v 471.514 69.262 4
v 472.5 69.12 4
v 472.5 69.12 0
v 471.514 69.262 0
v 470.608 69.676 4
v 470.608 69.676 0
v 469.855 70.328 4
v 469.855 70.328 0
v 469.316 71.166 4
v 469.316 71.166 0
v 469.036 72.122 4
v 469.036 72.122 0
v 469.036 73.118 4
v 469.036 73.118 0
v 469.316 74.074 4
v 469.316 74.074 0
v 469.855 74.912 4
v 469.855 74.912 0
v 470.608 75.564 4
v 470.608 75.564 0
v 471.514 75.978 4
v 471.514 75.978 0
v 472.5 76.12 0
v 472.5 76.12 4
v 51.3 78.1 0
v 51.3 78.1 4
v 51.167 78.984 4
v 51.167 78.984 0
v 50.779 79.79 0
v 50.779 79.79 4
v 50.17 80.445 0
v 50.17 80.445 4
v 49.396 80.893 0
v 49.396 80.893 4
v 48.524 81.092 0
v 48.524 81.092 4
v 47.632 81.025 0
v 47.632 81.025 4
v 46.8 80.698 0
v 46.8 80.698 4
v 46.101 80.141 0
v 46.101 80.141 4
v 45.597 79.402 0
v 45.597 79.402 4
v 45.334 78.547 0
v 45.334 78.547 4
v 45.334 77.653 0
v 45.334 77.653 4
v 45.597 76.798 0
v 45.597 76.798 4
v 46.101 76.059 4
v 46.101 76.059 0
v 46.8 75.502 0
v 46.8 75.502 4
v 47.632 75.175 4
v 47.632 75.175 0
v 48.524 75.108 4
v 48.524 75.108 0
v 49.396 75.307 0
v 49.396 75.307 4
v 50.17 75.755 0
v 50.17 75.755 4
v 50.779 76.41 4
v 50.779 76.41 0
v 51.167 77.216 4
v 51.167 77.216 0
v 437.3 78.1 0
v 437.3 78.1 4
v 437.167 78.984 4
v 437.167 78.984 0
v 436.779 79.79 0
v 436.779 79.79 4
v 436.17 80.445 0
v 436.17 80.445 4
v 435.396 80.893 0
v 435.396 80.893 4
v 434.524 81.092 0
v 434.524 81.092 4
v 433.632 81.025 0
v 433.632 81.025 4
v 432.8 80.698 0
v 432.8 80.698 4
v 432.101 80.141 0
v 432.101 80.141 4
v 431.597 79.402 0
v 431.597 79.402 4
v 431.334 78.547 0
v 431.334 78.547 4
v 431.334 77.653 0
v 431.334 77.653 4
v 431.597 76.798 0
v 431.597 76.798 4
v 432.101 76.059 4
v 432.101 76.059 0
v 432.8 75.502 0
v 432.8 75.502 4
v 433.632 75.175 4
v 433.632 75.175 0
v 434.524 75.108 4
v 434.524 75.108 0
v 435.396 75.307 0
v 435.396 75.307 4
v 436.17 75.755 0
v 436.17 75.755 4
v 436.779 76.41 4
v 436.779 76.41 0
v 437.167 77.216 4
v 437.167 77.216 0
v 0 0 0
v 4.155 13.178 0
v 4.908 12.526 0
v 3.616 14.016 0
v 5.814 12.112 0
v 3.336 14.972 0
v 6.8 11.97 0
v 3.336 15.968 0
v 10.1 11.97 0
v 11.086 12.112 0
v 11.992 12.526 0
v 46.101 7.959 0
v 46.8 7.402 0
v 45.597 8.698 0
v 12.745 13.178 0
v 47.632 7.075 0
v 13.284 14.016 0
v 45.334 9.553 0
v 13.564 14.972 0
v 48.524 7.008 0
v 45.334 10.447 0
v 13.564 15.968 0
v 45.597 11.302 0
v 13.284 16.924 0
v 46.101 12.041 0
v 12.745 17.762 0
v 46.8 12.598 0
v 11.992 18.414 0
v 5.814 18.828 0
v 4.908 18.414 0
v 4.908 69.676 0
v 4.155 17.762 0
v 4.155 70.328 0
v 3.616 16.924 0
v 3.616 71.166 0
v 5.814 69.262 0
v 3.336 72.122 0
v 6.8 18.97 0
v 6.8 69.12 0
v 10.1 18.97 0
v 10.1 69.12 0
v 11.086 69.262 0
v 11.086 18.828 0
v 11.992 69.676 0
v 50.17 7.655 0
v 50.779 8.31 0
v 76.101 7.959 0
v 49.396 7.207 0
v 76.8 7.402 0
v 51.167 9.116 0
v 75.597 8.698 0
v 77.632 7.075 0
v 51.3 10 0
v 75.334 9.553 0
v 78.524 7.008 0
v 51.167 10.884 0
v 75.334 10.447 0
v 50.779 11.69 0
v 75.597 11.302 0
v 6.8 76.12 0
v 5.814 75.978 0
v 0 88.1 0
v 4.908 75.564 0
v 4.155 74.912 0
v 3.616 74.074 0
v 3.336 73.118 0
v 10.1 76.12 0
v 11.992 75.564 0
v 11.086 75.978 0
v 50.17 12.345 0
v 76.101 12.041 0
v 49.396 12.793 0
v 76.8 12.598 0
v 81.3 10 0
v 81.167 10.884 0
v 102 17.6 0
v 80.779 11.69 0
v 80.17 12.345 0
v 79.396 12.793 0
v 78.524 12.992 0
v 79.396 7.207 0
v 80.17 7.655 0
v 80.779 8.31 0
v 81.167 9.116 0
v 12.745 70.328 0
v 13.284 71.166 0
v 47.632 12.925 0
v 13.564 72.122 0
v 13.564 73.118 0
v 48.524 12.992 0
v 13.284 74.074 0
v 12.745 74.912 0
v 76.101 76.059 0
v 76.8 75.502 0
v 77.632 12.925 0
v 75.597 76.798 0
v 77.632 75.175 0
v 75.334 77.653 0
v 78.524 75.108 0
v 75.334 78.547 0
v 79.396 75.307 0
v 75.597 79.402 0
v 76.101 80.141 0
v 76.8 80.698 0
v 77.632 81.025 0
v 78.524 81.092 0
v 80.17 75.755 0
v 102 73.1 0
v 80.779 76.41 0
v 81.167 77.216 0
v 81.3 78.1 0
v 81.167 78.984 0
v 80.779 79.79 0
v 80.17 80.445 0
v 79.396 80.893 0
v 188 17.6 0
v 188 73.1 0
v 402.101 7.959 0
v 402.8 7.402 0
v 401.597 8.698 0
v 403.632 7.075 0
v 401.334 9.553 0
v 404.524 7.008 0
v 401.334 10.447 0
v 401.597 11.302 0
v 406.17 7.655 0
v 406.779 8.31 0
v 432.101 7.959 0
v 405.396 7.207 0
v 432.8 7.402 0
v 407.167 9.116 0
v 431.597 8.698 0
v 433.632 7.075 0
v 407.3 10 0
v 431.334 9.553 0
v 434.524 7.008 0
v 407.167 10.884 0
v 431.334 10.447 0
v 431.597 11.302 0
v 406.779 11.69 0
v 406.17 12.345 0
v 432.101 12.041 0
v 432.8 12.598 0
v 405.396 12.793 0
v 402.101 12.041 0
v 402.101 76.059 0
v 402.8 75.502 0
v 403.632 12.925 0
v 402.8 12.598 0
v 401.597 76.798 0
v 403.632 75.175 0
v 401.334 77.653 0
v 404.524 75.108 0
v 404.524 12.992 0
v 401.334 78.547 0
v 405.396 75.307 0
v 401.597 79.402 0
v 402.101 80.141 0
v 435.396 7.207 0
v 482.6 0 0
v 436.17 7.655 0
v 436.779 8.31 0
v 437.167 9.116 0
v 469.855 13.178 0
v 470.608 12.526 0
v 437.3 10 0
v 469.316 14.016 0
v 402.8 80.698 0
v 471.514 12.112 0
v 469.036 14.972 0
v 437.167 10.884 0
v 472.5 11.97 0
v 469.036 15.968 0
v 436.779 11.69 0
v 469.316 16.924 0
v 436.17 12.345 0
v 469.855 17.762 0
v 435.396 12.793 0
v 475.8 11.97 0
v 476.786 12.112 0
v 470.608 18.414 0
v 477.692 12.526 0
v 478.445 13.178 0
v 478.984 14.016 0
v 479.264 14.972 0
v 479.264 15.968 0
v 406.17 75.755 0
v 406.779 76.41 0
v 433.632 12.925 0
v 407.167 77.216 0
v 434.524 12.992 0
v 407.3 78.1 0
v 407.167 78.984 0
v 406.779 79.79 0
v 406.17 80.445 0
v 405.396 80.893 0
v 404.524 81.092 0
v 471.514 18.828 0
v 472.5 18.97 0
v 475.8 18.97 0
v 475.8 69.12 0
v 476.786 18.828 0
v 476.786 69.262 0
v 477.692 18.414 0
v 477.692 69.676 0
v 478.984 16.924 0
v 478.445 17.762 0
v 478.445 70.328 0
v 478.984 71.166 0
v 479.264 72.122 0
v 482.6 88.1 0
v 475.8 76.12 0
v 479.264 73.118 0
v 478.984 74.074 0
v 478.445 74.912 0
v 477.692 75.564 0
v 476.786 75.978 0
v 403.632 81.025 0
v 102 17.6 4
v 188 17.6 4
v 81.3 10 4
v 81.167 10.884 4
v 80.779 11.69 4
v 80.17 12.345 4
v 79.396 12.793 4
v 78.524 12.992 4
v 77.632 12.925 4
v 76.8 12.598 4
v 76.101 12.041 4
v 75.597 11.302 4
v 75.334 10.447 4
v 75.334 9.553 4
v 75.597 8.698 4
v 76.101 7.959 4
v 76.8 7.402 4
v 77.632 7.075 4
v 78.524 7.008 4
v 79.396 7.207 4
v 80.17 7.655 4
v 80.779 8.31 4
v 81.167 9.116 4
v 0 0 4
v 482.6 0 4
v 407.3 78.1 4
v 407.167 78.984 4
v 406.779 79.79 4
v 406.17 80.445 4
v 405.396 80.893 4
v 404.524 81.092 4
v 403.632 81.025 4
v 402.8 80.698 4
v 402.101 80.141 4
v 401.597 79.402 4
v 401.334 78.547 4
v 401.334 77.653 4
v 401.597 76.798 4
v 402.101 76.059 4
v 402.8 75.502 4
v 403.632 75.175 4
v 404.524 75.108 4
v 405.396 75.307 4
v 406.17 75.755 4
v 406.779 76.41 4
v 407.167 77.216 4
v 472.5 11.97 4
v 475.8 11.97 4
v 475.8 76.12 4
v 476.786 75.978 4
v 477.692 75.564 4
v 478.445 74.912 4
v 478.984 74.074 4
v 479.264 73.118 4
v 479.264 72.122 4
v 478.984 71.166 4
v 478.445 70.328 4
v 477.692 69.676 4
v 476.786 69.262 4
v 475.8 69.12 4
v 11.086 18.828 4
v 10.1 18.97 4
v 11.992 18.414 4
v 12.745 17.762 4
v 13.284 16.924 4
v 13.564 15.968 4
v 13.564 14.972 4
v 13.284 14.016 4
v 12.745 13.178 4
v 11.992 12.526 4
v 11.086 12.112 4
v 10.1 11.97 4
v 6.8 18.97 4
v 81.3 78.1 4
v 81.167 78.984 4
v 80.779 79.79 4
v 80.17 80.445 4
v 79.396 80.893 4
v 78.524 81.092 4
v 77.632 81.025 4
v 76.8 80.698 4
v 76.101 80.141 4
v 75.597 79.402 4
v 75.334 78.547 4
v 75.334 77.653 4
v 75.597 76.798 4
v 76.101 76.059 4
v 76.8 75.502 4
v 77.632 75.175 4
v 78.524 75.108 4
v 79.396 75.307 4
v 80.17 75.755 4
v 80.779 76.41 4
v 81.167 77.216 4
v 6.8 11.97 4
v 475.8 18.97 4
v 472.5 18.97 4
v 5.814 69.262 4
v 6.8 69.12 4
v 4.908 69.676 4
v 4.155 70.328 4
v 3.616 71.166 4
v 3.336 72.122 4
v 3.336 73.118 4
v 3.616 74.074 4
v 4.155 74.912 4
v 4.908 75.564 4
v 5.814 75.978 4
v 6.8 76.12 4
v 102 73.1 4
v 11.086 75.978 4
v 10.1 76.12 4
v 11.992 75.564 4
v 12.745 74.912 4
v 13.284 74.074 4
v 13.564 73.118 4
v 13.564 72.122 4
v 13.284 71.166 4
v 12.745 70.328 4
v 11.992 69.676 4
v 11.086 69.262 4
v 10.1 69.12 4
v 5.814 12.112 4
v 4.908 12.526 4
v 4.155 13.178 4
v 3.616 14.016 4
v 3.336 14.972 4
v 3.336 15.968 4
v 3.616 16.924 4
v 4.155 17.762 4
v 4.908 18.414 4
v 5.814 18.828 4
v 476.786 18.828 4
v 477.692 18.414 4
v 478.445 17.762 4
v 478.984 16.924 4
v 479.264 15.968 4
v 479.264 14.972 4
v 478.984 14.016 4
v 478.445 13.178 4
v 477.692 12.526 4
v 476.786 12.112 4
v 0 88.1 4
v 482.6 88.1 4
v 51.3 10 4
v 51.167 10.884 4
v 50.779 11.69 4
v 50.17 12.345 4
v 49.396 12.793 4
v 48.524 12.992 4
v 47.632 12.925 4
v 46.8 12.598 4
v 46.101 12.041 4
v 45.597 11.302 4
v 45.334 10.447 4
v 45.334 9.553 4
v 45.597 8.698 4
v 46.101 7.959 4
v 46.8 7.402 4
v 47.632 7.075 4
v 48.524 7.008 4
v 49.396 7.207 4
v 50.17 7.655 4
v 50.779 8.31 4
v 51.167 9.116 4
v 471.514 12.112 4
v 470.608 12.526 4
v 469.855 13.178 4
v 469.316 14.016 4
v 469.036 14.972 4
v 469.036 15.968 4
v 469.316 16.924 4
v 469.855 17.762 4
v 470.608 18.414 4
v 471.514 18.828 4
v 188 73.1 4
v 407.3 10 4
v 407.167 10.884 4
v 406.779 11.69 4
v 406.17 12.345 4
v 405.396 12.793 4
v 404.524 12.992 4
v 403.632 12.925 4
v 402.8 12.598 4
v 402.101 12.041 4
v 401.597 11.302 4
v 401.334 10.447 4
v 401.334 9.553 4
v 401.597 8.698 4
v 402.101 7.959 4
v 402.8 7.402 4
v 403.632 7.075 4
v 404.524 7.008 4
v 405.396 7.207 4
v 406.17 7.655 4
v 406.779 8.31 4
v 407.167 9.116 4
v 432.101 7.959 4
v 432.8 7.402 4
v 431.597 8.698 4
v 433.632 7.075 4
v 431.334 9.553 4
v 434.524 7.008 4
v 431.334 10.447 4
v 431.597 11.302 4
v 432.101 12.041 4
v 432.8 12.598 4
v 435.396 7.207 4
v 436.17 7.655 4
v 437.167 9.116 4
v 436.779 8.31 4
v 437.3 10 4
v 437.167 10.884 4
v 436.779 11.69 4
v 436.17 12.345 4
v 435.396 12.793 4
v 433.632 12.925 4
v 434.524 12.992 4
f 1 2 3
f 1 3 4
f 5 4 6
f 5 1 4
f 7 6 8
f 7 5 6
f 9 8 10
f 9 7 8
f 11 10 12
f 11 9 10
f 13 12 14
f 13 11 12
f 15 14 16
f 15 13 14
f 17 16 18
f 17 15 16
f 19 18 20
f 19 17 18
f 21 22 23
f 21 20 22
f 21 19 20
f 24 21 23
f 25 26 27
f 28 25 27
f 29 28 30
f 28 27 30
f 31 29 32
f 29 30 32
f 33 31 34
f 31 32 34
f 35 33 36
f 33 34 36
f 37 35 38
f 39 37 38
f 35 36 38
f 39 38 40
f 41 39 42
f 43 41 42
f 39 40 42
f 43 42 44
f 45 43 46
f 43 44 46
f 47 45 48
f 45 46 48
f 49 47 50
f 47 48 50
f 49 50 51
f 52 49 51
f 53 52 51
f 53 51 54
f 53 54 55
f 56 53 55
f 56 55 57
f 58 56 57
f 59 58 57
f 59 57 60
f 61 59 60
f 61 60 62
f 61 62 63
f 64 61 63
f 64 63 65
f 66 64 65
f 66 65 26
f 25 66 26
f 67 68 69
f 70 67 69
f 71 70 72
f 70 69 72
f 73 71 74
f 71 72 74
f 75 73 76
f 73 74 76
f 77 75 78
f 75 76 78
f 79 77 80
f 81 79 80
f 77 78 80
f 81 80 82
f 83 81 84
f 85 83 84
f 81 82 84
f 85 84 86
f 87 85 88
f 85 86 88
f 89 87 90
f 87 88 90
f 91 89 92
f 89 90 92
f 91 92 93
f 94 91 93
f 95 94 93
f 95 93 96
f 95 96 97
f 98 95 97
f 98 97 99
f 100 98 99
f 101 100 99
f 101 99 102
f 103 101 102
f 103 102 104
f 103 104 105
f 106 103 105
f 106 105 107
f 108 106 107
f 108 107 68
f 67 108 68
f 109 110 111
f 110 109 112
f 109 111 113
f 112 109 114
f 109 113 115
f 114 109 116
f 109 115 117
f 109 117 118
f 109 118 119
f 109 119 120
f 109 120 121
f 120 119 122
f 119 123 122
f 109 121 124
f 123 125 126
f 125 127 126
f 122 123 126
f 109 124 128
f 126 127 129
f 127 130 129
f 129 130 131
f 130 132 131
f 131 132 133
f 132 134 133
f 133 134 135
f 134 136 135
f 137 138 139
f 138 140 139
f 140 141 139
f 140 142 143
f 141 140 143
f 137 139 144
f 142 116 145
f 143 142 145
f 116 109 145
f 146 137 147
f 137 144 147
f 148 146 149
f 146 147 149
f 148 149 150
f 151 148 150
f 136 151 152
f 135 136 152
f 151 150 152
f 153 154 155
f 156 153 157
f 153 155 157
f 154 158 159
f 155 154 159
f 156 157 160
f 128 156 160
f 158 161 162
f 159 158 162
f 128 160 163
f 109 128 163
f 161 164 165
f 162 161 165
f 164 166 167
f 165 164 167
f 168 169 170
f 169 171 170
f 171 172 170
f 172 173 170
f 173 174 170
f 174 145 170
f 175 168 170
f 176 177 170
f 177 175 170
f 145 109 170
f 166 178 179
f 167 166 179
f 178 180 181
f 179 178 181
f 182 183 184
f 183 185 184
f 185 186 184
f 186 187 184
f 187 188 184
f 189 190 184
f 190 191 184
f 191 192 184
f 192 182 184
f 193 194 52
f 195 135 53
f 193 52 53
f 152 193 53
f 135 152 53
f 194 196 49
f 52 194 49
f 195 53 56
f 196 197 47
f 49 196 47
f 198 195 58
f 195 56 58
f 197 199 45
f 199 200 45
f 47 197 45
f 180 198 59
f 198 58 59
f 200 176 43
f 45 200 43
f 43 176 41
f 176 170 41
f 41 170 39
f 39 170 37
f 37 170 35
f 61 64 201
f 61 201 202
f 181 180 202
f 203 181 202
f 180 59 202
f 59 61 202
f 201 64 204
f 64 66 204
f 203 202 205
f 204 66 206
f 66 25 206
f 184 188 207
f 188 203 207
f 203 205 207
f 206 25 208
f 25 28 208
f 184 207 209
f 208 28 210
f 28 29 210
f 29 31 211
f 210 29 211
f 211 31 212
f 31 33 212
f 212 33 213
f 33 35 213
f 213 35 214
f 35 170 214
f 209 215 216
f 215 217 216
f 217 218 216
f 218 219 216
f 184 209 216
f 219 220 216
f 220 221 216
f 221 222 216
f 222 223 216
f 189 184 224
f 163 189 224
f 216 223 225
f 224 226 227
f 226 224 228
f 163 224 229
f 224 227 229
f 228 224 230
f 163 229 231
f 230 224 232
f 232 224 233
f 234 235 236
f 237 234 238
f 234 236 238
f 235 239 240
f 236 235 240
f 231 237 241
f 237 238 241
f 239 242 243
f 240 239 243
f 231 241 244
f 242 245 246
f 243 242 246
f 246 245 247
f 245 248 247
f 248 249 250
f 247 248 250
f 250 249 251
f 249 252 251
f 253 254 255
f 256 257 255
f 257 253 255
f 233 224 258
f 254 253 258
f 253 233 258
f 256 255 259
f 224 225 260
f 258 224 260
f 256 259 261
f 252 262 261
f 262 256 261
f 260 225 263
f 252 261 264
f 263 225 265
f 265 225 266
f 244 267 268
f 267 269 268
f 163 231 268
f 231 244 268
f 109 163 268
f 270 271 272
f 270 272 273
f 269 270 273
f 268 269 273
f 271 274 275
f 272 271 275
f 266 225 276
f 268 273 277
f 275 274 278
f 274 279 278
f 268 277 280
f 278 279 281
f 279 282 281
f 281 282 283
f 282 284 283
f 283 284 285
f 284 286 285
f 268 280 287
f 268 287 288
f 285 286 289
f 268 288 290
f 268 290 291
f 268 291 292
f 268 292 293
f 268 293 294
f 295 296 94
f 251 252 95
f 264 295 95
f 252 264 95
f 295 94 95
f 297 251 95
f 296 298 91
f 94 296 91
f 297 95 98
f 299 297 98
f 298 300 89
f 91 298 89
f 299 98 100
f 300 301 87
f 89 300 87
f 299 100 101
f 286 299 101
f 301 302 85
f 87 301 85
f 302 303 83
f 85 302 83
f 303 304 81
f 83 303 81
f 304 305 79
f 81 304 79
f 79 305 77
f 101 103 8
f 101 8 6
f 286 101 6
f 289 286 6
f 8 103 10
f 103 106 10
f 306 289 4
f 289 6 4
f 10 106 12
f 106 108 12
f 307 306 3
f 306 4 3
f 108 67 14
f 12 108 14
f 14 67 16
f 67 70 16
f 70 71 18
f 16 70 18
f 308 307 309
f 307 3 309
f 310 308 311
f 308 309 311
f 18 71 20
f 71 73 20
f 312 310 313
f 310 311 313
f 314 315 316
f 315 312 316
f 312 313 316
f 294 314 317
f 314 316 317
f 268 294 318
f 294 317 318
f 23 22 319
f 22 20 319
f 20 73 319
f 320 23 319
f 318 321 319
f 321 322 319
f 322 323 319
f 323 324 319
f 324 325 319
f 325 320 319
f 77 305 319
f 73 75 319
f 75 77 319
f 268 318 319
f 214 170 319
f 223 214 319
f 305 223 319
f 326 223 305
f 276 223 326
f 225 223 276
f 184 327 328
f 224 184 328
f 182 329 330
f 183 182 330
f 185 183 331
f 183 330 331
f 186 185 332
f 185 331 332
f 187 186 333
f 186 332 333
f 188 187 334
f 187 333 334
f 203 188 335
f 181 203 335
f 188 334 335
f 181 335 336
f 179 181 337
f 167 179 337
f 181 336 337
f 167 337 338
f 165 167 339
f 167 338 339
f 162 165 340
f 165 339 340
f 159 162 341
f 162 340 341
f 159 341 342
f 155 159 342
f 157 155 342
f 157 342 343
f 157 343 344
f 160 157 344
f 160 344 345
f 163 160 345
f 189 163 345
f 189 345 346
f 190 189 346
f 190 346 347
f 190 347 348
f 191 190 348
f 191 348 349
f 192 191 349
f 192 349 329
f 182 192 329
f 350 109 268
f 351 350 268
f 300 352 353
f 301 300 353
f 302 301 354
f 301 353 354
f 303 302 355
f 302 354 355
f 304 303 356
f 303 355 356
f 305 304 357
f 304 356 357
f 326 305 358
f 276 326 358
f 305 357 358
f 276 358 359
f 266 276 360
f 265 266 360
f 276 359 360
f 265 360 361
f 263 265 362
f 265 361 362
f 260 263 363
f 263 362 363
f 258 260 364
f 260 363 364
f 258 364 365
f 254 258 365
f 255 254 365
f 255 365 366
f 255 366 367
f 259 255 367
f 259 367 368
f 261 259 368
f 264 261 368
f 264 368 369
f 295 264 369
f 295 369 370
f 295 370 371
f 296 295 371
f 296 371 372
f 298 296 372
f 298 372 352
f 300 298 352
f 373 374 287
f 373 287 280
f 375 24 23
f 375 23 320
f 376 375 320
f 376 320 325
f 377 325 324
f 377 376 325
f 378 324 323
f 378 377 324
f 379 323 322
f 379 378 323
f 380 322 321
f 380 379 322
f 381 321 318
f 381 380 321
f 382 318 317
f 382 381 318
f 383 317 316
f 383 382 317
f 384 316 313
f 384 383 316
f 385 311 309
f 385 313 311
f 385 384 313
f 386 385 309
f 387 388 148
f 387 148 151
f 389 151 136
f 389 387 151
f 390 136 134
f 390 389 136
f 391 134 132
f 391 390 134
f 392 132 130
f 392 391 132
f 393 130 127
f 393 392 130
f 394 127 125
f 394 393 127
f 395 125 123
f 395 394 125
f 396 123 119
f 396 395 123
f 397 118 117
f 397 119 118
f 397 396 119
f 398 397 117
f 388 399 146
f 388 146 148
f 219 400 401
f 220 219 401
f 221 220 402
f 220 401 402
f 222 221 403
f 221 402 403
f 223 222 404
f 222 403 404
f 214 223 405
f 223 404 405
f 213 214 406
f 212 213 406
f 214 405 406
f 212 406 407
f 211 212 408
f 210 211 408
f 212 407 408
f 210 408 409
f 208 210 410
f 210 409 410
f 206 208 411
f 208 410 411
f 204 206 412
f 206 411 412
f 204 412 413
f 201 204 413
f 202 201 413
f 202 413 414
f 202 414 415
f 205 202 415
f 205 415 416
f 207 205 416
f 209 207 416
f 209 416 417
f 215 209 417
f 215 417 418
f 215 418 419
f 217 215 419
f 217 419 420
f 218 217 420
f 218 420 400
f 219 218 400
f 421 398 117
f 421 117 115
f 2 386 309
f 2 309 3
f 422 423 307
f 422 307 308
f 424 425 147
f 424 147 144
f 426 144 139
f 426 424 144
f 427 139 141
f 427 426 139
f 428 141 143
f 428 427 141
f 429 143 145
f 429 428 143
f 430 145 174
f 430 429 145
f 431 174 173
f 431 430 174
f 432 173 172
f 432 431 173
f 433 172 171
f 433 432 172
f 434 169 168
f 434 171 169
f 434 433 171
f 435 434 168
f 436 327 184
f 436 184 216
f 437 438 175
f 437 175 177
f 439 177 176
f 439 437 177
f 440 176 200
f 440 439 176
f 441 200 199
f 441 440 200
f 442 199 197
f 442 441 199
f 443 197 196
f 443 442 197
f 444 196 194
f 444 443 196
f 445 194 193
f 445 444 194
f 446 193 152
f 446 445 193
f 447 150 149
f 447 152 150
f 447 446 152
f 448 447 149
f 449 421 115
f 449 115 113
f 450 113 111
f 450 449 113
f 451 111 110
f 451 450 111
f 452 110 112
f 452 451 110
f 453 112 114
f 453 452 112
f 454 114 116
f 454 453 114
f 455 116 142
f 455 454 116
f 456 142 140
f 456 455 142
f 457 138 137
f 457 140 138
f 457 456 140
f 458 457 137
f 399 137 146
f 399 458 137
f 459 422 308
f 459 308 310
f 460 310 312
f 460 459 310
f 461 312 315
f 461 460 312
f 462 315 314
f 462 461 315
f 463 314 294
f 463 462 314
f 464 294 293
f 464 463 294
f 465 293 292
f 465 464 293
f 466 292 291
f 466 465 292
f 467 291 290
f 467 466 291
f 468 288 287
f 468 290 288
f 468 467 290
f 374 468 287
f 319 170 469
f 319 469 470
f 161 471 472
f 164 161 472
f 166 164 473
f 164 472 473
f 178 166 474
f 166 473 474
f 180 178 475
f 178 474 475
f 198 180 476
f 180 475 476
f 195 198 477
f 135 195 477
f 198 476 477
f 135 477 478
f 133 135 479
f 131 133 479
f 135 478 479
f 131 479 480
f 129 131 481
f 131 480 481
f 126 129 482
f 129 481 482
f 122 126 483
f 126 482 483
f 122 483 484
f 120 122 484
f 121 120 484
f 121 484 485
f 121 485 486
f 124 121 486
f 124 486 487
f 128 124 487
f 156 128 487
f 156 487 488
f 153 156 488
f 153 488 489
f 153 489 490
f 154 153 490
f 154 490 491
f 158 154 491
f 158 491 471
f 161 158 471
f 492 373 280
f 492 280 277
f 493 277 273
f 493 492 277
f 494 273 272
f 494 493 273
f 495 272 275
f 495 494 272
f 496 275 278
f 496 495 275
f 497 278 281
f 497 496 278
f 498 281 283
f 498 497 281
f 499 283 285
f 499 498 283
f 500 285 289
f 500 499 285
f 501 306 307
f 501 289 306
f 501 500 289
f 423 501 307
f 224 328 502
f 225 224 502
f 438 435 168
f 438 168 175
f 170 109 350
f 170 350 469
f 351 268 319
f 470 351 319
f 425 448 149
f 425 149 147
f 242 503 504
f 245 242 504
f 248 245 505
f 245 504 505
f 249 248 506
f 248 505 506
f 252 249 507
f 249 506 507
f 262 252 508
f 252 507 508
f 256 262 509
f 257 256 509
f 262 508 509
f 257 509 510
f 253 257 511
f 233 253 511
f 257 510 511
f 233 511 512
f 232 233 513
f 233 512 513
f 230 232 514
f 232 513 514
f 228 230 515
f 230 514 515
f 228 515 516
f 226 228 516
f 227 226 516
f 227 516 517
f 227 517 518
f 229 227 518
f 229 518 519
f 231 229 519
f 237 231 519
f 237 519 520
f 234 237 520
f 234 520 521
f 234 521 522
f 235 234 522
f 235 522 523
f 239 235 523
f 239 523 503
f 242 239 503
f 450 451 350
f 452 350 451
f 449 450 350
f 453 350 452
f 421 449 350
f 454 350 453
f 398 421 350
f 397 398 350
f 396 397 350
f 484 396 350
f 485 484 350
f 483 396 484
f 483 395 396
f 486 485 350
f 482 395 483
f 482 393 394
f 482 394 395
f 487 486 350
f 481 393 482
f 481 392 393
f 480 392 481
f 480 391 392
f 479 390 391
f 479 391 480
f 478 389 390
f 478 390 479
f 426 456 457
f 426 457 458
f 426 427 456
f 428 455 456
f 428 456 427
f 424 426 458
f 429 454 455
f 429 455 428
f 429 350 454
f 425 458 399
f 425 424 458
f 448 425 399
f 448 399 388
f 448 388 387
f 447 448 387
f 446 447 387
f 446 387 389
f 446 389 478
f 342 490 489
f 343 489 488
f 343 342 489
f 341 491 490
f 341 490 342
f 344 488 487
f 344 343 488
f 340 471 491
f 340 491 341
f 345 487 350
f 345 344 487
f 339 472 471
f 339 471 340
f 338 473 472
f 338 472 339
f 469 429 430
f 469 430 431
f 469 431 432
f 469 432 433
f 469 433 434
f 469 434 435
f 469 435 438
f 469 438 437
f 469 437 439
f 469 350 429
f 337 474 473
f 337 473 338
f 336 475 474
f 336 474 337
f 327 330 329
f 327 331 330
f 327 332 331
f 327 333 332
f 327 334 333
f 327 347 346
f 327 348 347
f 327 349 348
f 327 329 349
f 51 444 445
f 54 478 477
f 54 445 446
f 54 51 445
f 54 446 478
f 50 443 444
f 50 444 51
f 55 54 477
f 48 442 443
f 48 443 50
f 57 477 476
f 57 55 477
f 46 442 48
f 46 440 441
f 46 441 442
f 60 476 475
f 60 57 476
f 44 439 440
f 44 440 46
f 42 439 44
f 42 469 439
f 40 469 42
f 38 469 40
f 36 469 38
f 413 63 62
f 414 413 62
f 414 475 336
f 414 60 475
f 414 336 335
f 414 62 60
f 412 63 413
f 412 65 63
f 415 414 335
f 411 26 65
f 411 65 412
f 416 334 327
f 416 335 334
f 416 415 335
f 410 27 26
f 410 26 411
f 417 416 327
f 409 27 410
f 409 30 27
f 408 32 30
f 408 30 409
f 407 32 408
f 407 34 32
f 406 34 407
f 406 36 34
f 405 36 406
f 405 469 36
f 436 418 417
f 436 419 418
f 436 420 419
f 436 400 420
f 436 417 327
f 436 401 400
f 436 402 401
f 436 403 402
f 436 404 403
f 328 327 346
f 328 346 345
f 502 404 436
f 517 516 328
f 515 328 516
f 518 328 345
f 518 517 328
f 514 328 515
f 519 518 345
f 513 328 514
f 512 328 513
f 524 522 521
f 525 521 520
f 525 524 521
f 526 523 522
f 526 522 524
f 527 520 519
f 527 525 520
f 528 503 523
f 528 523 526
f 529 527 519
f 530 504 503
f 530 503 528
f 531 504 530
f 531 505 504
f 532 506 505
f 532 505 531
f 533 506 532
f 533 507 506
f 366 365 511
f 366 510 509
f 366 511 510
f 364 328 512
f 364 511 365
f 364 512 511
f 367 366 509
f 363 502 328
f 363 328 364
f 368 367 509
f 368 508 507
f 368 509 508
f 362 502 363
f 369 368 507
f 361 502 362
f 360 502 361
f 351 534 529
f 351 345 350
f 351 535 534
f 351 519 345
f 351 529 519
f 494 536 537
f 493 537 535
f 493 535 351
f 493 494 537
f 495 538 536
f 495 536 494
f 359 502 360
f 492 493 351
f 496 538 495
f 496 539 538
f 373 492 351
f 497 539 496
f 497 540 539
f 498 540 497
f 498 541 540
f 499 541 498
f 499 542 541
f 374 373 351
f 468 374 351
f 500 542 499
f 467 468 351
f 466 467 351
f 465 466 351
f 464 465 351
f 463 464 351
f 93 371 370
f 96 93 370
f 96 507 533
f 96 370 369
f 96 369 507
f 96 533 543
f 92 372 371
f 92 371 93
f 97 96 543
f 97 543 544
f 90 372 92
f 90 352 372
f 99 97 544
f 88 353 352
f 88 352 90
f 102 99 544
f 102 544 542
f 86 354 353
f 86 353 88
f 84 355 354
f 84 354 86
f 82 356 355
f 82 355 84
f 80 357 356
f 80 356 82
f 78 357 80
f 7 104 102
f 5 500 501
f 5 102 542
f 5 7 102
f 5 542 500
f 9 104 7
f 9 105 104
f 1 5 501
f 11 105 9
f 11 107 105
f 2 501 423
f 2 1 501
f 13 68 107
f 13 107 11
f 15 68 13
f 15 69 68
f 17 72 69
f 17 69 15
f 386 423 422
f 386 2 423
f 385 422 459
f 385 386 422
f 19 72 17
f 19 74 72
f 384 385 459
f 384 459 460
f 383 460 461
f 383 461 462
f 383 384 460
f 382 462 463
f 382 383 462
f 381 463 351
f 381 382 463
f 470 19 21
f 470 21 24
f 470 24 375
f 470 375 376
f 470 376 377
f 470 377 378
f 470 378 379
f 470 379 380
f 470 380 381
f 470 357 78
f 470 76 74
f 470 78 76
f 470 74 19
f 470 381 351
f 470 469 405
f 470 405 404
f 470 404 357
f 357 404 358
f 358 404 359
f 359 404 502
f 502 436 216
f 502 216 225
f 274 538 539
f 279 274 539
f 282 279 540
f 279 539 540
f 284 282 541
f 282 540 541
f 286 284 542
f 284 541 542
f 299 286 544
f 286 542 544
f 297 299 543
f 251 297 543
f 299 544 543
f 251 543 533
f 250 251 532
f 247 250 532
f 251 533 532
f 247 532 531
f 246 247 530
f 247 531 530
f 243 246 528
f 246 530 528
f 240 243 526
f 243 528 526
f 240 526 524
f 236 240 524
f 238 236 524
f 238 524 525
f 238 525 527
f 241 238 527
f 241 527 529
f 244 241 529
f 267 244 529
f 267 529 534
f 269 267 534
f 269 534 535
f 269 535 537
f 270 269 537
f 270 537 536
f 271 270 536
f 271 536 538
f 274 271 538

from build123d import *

# Parameters (mm, degrees)
SKETCH_1_W          = 482.6
SKETCH_1_H          = 88.1
EXTRUDE_1_DEPTH     = 4
CUT_EXTRUDE_1_DEPTH = 491.591856842
SKETCH_3_R          = 3
CUT_EXTRUDE_2_DEPTH = 491.591856842
SKETCH_4_W          = 86
SKETCH_4_H          = 55.5
CUT_EXTRUDE_3_DEPTH = 491.591856842


with BuildPart() as part:
    # Эскиз1 → Бобышка-Вытянуть1 (new body)
    with BuildSketch(Plane.XY):
        with Locations((241.3, 44.05)):
            Rectangle(SKETCH_1_W, SKETCH_1_H)
    extrude(amount=EXTRUDE_1_DEPTH)

    # Эскиз2 → Вырез-Вытянуть1 (cut, through all)
    with BuildSketch(Plane.XY.offset(4)):
        with BuildLine():
            Line((6.8, 76.12), (10.1, 76.12))
            ThreePointArc((10.1, 76.12), (13.6, 72.62), (10.1, 69.12))
            Line((10.1, 69.12), (6.8, 69.12))
            ThreePointArc((6.8, 69.12), (3.3, 72.62), (6.8, 76.12))
        make_face()
        with BuildLine():
            Line((472.5, 76.12), (475.8, 76.12))
            ThreePointArc((475.8, 76.12), (479.3, 72.62), (475.8, 69.12))
            Line((475.8, 69.12), (472.5, 69.12))
            ThreePointArc((472.5, 69.12), (469, 72.62), (472.5, 76.12))
        make_face()
        with BuildLine():
            Line((472.5, 18.97), (475.8, 18.97))
            ThreePointArc((475.8, 18.97), (479.3, 15.47), (475.8, 11.97))
            Line((475.8, 11.97), (472.5, 11.97))
            ThreePointArc((472.5, 11.97), (469, 15.47), (472.5, 18.97))
        make_face()
        with BuildLine():
            Line((6.8, 18.97), (10.1, 18.97))
            ThreePointArc((10.1, 18.97), (13.6, 15.47), (10.1, 11.97))
            Line((10.1, 11.97), (6.8, 11.97))
            ThreePointArc((6.8, 11.97), (3.3, 15.47), (6.8, 18.97))
        make_face()
    extrude(amount=-CUT_EXTRUDE_1_DEPTH, mode=Mode.SUBTRACT)

    # Эскиз3 → Вырез-Вытянуть2 (cut, through all)
    with BuildSketch(Plane.XY.offset(4)):
        with Locations((78.3, 78.1)):
            Circle(SKETCH_3_R)
        with Locations((404.3, 78.1)):
            Circle(SKETCH_3_R)
        with Locations((404.3, 10)):
            Circle(SKETCH_3_R)
        with Locations((78.3, 10)):
            Circle(SKETCH_3_R)
        with Locations((48.3, 78.1)):
            Circle(SKETCH_3_R)
        with Locations((434.3, 78.1)):
            Circle(SKETCH_3_R)
        with Locations((434.3, 10)):
            Circle(SKETCH_3_R)
        with Locations((48.3, 10)):
            Circle(SKETCH_3_R)
    extrude(amount=-CUT_EXTRUDE_2_DEPTH, mode=Mode.SUBTRACT)

    # Эскиз4 → Вырез-Вытянуть3 (cut, through all)
    with BuildSketch(Plane.XY.offset(4)):
        with Locations((145, 45.35)):
            Rectangle(SKETCH_4_W, SKETCH_4_H)
    extrude(amount=-CUT_EXTRUDE_3_DEPTH, mode=Mode.SUBTRACT)


solid = part.part
